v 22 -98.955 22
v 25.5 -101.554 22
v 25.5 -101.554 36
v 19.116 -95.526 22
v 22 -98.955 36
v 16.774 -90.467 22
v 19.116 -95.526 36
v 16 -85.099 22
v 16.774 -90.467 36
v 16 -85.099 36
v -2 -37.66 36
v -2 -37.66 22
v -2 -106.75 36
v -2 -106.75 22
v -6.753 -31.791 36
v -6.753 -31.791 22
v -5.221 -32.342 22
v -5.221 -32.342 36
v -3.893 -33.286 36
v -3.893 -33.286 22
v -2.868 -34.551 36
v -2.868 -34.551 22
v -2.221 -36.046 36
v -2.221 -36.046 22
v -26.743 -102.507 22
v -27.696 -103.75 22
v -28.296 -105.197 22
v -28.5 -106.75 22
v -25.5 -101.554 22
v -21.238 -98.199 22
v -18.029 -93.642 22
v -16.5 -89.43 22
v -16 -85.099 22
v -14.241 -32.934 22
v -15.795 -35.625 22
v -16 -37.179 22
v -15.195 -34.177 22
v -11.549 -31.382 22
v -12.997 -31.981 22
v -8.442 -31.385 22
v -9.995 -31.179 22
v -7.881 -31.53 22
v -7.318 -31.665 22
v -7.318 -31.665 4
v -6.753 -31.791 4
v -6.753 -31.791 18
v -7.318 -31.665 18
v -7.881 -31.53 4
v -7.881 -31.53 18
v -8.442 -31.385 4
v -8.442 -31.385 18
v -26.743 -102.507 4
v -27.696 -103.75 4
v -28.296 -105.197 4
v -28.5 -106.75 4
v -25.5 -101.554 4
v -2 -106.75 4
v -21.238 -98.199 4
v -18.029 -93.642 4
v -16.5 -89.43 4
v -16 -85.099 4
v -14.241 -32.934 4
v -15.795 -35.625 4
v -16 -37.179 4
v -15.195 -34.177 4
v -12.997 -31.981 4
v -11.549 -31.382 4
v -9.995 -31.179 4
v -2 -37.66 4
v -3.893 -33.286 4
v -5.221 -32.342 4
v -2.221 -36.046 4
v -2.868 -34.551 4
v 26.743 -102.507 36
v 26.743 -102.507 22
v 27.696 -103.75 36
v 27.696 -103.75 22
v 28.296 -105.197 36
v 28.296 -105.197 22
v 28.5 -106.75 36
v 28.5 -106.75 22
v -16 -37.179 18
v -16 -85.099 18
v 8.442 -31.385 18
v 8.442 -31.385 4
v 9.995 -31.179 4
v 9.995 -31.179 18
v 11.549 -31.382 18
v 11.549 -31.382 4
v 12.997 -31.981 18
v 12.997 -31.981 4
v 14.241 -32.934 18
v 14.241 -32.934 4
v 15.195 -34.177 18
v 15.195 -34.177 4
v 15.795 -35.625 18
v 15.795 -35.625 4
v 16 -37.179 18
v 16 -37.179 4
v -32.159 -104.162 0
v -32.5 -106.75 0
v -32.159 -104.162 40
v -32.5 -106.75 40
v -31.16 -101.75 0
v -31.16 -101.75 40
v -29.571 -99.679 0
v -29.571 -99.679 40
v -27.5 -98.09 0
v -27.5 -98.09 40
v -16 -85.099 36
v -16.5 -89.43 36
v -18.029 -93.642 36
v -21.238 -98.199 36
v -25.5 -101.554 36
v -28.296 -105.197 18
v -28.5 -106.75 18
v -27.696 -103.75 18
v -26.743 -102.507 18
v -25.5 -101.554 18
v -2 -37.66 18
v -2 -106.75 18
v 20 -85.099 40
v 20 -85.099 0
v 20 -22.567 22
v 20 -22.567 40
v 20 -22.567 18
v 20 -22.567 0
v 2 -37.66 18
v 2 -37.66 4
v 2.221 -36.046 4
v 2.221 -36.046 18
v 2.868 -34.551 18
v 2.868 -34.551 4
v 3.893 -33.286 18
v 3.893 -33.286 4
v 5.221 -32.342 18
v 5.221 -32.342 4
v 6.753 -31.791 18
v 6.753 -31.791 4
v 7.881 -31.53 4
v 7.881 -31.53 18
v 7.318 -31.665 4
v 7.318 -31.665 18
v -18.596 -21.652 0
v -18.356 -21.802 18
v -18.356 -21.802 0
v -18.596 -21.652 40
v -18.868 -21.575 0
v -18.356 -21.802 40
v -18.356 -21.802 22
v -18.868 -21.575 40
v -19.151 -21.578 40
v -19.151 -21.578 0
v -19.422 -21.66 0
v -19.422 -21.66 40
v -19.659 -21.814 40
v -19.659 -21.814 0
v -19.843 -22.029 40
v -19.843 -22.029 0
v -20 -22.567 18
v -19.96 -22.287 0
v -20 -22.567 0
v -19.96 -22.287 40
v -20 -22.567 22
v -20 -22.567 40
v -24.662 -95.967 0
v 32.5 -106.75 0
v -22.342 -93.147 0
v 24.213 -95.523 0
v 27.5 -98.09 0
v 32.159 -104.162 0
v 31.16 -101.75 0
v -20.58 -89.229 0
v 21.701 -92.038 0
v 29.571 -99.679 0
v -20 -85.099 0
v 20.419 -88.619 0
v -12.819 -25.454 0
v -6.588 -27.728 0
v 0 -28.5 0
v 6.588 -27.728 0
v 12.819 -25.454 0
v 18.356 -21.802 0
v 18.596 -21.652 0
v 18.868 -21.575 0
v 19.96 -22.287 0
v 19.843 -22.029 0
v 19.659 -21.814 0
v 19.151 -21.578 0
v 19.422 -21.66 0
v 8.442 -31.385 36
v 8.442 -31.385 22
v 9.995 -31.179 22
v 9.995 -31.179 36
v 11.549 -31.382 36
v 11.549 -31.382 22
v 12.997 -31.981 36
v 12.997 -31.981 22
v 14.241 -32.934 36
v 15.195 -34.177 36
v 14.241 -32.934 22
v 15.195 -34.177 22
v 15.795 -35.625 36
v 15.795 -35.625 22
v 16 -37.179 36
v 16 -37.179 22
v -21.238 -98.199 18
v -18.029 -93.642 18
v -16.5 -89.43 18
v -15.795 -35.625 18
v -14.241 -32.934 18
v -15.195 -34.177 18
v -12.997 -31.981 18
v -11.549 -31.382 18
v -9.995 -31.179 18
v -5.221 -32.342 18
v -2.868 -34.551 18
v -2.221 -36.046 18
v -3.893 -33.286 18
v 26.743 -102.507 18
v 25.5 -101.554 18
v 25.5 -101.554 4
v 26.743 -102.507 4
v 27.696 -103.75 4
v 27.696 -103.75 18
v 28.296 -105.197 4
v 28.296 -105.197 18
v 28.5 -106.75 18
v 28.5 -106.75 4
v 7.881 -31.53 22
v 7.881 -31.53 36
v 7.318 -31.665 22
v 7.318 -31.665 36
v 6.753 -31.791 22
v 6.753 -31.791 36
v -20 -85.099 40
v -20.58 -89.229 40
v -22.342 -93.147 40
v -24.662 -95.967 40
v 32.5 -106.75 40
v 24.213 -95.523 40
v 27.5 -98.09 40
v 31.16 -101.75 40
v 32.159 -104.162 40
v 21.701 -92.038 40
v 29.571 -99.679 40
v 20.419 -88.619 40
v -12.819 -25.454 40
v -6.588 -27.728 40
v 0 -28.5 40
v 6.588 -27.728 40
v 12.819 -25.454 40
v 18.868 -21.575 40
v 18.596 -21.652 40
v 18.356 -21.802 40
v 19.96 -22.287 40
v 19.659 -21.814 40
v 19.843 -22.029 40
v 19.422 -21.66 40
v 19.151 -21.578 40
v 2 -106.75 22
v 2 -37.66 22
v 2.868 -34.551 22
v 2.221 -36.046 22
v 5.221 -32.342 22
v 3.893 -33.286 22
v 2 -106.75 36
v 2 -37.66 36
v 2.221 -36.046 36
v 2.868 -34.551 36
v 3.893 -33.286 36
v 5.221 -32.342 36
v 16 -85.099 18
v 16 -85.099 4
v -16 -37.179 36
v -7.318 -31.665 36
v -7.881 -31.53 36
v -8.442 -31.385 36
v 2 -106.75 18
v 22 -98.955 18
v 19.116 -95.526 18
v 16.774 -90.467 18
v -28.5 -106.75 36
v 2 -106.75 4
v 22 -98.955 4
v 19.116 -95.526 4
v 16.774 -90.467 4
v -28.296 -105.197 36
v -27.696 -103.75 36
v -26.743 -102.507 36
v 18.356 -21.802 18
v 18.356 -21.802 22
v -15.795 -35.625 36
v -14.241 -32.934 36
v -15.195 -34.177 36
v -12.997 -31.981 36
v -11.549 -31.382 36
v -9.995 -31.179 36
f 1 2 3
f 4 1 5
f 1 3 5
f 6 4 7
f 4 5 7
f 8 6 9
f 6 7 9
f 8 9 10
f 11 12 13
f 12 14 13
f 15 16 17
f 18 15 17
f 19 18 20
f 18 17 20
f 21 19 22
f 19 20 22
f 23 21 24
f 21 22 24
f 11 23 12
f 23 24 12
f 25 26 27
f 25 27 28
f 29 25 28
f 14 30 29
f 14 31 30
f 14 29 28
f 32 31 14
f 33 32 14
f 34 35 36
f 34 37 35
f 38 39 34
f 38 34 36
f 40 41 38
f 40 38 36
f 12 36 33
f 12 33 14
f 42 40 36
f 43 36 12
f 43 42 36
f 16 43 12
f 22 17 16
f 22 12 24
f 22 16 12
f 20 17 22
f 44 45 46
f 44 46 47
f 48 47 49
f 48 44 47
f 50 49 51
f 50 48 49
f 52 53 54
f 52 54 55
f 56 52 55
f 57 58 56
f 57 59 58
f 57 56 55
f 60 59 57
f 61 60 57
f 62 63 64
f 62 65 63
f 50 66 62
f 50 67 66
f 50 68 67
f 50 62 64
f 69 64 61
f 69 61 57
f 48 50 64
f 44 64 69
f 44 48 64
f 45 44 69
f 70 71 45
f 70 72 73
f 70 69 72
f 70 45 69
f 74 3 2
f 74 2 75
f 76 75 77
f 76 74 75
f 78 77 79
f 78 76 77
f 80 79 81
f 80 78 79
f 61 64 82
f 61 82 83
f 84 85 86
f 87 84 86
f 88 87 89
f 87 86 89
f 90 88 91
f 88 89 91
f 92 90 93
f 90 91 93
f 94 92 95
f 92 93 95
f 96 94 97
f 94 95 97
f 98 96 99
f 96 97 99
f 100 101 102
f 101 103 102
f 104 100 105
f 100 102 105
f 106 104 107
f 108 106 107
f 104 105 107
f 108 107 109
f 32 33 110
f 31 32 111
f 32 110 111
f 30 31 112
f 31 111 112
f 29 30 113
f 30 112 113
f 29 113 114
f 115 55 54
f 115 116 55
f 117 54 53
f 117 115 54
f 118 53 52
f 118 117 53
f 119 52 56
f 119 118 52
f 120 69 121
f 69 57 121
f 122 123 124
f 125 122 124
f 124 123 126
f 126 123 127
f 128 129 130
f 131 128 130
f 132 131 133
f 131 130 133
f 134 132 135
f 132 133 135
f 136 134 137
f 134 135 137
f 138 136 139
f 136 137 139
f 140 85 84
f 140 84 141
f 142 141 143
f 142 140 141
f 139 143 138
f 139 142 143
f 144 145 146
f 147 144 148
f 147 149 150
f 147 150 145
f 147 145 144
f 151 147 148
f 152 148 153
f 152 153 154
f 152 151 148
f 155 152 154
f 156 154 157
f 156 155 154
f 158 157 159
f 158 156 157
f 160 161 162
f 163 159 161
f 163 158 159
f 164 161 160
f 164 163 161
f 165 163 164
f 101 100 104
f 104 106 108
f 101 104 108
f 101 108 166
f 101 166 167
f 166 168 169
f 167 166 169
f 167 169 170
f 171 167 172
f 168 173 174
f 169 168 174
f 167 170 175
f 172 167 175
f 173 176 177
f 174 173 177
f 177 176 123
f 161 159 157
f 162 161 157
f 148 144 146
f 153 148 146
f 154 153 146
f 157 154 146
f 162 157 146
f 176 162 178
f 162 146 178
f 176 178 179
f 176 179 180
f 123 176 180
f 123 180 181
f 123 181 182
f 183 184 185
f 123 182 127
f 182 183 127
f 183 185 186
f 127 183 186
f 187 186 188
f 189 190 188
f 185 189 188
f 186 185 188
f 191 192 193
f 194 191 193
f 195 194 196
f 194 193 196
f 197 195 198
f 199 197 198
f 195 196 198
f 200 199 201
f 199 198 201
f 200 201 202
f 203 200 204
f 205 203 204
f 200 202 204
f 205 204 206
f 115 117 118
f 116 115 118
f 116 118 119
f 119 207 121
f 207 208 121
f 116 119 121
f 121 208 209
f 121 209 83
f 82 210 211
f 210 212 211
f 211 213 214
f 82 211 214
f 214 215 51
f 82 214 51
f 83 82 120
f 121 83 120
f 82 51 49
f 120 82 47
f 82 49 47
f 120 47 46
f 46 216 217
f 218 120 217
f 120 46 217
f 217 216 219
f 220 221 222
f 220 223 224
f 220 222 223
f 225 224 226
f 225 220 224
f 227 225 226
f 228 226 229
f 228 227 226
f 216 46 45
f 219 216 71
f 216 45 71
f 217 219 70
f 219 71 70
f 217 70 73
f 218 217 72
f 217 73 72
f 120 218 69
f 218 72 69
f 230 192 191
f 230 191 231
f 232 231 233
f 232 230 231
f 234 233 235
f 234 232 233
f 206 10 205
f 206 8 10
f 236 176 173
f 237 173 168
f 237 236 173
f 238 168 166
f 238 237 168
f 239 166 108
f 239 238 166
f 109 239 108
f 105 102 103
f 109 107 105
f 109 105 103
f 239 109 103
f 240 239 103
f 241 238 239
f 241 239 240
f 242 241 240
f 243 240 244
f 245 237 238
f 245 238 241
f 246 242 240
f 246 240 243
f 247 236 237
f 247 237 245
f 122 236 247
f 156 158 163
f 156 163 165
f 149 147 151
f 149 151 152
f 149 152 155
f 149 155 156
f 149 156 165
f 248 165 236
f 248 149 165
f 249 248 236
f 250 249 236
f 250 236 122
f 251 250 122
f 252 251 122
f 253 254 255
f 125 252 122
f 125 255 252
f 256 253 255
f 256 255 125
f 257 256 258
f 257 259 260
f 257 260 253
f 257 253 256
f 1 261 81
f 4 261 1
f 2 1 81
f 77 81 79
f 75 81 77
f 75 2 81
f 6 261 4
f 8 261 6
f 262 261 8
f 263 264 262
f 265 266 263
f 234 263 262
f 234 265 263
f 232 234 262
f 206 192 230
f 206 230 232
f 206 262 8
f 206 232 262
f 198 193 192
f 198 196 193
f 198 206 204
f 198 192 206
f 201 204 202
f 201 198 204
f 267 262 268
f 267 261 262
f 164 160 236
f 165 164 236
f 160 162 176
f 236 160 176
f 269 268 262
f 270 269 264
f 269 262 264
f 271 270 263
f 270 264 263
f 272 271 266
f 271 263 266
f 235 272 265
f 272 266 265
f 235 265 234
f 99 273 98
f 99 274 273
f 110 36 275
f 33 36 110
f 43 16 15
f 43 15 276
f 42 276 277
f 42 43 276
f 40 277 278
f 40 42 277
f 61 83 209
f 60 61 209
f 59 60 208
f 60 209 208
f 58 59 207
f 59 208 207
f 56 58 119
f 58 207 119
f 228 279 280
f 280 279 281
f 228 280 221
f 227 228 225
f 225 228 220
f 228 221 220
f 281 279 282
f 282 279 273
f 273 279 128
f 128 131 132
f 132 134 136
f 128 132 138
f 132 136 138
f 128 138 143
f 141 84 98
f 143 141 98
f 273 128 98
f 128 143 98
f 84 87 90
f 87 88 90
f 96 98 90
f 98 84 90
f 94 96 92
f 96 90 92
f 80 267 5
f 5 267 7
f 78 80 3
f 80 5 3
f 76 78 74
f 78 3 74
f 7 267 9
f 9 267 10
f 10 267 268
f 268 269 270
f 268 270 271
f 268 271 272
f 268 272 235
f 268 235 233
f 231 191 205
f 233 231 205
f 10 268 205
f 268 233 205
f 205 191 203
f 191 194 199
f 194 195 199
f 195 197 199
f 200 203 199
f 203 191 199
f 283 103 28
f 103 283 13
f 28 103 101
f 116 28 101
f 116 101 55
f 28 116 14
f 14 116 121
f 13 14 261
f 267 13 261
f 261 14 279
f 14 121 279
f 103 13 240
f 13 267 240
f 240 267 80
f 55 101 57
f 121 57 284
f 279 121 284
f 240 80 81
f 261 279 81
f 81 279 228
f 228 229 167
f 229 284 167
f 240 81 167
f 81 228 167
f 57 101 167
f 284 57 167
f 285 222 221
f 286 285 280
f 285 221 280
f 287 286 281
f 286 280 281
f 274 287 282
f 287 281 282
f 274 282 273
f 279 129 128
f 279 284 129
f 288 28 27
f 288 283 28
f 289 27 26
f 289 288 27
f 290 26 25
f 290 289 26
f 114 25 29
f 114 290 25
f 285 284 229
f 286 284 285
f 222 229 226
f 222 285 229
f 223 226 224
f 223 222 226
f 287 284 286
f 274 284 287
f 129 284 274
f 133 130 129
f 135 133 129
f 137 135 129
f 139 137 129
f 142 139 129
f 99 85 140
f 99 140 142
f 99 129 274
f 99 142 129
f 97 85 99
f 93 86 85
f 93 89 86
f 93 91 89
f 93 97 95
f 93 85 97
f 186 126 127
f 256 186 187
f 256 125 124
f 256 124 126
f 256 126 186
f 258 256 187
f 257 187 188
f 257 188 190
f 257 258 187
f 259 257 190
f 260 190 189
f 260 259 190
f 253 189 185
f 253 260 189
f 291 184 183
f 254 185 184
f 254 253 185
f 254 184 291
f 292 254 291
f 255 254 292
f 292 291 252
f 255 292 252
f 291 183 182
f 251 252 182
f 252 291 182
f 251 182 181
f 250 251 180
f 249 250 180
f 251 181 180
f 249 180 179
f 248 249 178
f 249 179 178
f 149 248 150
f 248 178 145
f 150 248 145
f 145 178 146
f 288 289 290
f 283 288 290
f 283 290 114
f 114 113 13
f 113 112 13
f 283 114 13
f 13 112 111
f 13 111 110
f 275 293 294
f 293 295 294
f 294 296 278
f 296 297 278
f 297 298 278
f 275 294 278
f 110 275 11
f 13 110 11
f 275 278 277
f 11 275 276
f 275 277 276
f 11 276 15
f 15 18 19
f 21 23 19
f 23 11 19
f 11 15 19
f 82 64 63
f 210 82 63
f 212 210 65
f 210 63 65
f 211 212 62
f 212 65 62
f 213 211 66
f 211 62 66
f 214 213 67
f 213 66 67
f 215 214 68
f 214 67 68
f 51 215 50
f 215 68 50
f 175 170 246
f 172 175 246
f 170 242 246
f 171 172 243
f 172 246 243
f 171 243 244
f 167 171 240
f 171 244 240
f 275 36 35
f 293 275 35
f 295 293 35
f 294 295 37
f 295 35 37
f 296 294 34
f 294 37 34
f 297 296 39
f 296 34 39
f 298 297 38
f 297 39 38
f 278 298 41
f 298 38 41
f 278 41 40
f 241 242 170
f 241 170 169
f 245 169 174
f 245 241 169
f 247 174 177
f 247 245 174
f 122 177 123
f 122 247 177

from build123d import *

# Parameters (mm, degrees)
EXTRUDE_1_DEPTH      = 40
FILLET_1_R           = 1
FILLET_2_R           = 10
FILLET_3_R           = 15
SHELL_1_T            = -4
EXTRUDE_2_REACH      = 101.561
EXTRUDE_2_END_RADIUS = 32.5
SKETCH_3_W           = 4
SKETCH_3_H           = 32
FILLET_4_R           = 6
EXTRUDE_3_DEPTH      = 2
EXTRUDE_3_DEPTH_BACK = 2
EXTRUDE_3_START      = -20


with BuildPart() as part:
    # 草图1 → 凸台-拉伸1 (new body)
    with BuildSketch(Plane.XY):
        with BuildLine():
            Line((-32.5, -106.75), (32.5, -106.75))
            Line((32.5, -106.75), (32.5, -96.75))
            Line((32.5, -96.75), (20, -96.75))
            Line((20, -96.75), (20, -20.303940504))
            ThreePointArc((20, -20.303940504), (0, -28.5), (-20, -20.303940504))
            Line((-20, -20.303940504), (-20, -96.75))
            Line((-20, -96.75), (-32.5, -96.75))
            Line((-32.5, -96.75), (-32.5, -106.75))
        make_face()
    extrude(amount=EXTRUDE_1_DEPTH)

    # 圆角1
    fillet_1_edges = [part.edges().sort_by_distance(p)[0] for p in [
        (-20, -20.303940504, 20),
        (20, -20.303940504, 20),
    ]]
    fillet(fillet_1_edges, radius=FILLET_1_R)

    # 圆角2
    fillet_2_edges = [part.edges().sort_by_distance(p)[0] for p in [
        (32.5, -96.75, 20),
        (-32.5, -96.75, 20),
    ]]
    fillet(fillet_2_edges, radius=FILLET_2_R - 0.0001)  # a hair under: the kernel refuses the full size

    # 圆角3
    fillet_3_edges = [part.edges().sort_by_distance(p)[0] for p in [
        (20, -96.75, 20),
        (-20, -96.75, 20),
    ]]
    fillet(fillet_3_edges, radius=FILLET_3_R)

    # 抽壳1
    shell_1_openings = [part.faces().sort_by_distance(p)[0] for p in [
        (0, -106.75, 20),
    ]]
    offset(amount=SHELL_1_T, openings=shell_1_openings)

    # 凸台-拉伸2: up to this cylinder (the profile starts outside it)
    extrude_2_end = Plane(origin=(0, 0, 20), z_dir=(0, 0, -1)) * Cylinder(EXTRUDE_2_END_RADIUS, 269.122, mode=Mode.PRIVATE)
    # 草图3 → 凸台-拉伸2 (add, up to the surface)
    with BuildSketch(Plane.XZ.offset(106.75), mode=Mode.PRIVATE) as extrude_2_sk1:
        with Locations((0, 20)):
            Rectangle(SKETCH_3_W, SKETCH_3_H)
    extrude_2_tool1 = extrude(extrude_2_sk1.sketch, amount=-EXTRUDE_2_REACH, mode=Mode.PRIVATE) - extrude_2_end
    add(extrude_2_tool1.solids().sort_by_distance((0, -106.75, 20))[0])

    # 圆角4
    fillet_4_edges = [part.edges().sort_by_distance(p)[0] for p in [
        (16, -28.28869032, 20),
        (-16, -28.28869032, 20),
        (-2, -32.438403167, 20),
        (2, -32.438403167, 20),
    ]]
    fillet(fillet_4_edges, radius=FILLET_4_R)

    # 草图5 → 凸台-拉伸3 (add, two sides: drawn at the far end of the back side and taken through both)
    with BuildSketch(Plane.XY.offset(40).offset(EXTRUDE_3_START - EXTRUDE_3_DEPTH_BACK)):
        with BuildLine():
            Line((-32.5, -106.75), (32.5, -106.75))
            ThreePointArc((32.5, -106.75), (31.160254038, -101.75), (27.5, -98.089745962))
            ThreePointArc((27.5, -98.089745962), (22.009618943, -92.599364905), (20, -85.099364905))
            Line((20, -85.099364905), (20, -22.566568193))
            ThreePointArc((20, -22.566568193), (19.421860287, -21.659907342), (18.355932203, -21.801599779))
            ThreePointArc((18.355932203, -21.801599779), (0, -28.5), (-18.355932203, -21.801599779))
            ThreePointArc((-18.355932203, -21.801599779), (-19.421860287, -21.659907342), (-20, -22.566568193))
            Line((-20, -22.566568193), (-20, -85.099364905))
            ThreePointArc((-20, -85.099364905), (-22.009618943, -92.599364905), (-27.5, -98.089745962))
            ThreePointArc((-27.5, -98.089745962), (-31.160254038, -101.75), (-32.5, -106.75))
        make_face()
    extrude(amount=EXTRUDE_3_DEPTH + EXTRUDE_3_DEPTH_BACK)


solid = part.part
